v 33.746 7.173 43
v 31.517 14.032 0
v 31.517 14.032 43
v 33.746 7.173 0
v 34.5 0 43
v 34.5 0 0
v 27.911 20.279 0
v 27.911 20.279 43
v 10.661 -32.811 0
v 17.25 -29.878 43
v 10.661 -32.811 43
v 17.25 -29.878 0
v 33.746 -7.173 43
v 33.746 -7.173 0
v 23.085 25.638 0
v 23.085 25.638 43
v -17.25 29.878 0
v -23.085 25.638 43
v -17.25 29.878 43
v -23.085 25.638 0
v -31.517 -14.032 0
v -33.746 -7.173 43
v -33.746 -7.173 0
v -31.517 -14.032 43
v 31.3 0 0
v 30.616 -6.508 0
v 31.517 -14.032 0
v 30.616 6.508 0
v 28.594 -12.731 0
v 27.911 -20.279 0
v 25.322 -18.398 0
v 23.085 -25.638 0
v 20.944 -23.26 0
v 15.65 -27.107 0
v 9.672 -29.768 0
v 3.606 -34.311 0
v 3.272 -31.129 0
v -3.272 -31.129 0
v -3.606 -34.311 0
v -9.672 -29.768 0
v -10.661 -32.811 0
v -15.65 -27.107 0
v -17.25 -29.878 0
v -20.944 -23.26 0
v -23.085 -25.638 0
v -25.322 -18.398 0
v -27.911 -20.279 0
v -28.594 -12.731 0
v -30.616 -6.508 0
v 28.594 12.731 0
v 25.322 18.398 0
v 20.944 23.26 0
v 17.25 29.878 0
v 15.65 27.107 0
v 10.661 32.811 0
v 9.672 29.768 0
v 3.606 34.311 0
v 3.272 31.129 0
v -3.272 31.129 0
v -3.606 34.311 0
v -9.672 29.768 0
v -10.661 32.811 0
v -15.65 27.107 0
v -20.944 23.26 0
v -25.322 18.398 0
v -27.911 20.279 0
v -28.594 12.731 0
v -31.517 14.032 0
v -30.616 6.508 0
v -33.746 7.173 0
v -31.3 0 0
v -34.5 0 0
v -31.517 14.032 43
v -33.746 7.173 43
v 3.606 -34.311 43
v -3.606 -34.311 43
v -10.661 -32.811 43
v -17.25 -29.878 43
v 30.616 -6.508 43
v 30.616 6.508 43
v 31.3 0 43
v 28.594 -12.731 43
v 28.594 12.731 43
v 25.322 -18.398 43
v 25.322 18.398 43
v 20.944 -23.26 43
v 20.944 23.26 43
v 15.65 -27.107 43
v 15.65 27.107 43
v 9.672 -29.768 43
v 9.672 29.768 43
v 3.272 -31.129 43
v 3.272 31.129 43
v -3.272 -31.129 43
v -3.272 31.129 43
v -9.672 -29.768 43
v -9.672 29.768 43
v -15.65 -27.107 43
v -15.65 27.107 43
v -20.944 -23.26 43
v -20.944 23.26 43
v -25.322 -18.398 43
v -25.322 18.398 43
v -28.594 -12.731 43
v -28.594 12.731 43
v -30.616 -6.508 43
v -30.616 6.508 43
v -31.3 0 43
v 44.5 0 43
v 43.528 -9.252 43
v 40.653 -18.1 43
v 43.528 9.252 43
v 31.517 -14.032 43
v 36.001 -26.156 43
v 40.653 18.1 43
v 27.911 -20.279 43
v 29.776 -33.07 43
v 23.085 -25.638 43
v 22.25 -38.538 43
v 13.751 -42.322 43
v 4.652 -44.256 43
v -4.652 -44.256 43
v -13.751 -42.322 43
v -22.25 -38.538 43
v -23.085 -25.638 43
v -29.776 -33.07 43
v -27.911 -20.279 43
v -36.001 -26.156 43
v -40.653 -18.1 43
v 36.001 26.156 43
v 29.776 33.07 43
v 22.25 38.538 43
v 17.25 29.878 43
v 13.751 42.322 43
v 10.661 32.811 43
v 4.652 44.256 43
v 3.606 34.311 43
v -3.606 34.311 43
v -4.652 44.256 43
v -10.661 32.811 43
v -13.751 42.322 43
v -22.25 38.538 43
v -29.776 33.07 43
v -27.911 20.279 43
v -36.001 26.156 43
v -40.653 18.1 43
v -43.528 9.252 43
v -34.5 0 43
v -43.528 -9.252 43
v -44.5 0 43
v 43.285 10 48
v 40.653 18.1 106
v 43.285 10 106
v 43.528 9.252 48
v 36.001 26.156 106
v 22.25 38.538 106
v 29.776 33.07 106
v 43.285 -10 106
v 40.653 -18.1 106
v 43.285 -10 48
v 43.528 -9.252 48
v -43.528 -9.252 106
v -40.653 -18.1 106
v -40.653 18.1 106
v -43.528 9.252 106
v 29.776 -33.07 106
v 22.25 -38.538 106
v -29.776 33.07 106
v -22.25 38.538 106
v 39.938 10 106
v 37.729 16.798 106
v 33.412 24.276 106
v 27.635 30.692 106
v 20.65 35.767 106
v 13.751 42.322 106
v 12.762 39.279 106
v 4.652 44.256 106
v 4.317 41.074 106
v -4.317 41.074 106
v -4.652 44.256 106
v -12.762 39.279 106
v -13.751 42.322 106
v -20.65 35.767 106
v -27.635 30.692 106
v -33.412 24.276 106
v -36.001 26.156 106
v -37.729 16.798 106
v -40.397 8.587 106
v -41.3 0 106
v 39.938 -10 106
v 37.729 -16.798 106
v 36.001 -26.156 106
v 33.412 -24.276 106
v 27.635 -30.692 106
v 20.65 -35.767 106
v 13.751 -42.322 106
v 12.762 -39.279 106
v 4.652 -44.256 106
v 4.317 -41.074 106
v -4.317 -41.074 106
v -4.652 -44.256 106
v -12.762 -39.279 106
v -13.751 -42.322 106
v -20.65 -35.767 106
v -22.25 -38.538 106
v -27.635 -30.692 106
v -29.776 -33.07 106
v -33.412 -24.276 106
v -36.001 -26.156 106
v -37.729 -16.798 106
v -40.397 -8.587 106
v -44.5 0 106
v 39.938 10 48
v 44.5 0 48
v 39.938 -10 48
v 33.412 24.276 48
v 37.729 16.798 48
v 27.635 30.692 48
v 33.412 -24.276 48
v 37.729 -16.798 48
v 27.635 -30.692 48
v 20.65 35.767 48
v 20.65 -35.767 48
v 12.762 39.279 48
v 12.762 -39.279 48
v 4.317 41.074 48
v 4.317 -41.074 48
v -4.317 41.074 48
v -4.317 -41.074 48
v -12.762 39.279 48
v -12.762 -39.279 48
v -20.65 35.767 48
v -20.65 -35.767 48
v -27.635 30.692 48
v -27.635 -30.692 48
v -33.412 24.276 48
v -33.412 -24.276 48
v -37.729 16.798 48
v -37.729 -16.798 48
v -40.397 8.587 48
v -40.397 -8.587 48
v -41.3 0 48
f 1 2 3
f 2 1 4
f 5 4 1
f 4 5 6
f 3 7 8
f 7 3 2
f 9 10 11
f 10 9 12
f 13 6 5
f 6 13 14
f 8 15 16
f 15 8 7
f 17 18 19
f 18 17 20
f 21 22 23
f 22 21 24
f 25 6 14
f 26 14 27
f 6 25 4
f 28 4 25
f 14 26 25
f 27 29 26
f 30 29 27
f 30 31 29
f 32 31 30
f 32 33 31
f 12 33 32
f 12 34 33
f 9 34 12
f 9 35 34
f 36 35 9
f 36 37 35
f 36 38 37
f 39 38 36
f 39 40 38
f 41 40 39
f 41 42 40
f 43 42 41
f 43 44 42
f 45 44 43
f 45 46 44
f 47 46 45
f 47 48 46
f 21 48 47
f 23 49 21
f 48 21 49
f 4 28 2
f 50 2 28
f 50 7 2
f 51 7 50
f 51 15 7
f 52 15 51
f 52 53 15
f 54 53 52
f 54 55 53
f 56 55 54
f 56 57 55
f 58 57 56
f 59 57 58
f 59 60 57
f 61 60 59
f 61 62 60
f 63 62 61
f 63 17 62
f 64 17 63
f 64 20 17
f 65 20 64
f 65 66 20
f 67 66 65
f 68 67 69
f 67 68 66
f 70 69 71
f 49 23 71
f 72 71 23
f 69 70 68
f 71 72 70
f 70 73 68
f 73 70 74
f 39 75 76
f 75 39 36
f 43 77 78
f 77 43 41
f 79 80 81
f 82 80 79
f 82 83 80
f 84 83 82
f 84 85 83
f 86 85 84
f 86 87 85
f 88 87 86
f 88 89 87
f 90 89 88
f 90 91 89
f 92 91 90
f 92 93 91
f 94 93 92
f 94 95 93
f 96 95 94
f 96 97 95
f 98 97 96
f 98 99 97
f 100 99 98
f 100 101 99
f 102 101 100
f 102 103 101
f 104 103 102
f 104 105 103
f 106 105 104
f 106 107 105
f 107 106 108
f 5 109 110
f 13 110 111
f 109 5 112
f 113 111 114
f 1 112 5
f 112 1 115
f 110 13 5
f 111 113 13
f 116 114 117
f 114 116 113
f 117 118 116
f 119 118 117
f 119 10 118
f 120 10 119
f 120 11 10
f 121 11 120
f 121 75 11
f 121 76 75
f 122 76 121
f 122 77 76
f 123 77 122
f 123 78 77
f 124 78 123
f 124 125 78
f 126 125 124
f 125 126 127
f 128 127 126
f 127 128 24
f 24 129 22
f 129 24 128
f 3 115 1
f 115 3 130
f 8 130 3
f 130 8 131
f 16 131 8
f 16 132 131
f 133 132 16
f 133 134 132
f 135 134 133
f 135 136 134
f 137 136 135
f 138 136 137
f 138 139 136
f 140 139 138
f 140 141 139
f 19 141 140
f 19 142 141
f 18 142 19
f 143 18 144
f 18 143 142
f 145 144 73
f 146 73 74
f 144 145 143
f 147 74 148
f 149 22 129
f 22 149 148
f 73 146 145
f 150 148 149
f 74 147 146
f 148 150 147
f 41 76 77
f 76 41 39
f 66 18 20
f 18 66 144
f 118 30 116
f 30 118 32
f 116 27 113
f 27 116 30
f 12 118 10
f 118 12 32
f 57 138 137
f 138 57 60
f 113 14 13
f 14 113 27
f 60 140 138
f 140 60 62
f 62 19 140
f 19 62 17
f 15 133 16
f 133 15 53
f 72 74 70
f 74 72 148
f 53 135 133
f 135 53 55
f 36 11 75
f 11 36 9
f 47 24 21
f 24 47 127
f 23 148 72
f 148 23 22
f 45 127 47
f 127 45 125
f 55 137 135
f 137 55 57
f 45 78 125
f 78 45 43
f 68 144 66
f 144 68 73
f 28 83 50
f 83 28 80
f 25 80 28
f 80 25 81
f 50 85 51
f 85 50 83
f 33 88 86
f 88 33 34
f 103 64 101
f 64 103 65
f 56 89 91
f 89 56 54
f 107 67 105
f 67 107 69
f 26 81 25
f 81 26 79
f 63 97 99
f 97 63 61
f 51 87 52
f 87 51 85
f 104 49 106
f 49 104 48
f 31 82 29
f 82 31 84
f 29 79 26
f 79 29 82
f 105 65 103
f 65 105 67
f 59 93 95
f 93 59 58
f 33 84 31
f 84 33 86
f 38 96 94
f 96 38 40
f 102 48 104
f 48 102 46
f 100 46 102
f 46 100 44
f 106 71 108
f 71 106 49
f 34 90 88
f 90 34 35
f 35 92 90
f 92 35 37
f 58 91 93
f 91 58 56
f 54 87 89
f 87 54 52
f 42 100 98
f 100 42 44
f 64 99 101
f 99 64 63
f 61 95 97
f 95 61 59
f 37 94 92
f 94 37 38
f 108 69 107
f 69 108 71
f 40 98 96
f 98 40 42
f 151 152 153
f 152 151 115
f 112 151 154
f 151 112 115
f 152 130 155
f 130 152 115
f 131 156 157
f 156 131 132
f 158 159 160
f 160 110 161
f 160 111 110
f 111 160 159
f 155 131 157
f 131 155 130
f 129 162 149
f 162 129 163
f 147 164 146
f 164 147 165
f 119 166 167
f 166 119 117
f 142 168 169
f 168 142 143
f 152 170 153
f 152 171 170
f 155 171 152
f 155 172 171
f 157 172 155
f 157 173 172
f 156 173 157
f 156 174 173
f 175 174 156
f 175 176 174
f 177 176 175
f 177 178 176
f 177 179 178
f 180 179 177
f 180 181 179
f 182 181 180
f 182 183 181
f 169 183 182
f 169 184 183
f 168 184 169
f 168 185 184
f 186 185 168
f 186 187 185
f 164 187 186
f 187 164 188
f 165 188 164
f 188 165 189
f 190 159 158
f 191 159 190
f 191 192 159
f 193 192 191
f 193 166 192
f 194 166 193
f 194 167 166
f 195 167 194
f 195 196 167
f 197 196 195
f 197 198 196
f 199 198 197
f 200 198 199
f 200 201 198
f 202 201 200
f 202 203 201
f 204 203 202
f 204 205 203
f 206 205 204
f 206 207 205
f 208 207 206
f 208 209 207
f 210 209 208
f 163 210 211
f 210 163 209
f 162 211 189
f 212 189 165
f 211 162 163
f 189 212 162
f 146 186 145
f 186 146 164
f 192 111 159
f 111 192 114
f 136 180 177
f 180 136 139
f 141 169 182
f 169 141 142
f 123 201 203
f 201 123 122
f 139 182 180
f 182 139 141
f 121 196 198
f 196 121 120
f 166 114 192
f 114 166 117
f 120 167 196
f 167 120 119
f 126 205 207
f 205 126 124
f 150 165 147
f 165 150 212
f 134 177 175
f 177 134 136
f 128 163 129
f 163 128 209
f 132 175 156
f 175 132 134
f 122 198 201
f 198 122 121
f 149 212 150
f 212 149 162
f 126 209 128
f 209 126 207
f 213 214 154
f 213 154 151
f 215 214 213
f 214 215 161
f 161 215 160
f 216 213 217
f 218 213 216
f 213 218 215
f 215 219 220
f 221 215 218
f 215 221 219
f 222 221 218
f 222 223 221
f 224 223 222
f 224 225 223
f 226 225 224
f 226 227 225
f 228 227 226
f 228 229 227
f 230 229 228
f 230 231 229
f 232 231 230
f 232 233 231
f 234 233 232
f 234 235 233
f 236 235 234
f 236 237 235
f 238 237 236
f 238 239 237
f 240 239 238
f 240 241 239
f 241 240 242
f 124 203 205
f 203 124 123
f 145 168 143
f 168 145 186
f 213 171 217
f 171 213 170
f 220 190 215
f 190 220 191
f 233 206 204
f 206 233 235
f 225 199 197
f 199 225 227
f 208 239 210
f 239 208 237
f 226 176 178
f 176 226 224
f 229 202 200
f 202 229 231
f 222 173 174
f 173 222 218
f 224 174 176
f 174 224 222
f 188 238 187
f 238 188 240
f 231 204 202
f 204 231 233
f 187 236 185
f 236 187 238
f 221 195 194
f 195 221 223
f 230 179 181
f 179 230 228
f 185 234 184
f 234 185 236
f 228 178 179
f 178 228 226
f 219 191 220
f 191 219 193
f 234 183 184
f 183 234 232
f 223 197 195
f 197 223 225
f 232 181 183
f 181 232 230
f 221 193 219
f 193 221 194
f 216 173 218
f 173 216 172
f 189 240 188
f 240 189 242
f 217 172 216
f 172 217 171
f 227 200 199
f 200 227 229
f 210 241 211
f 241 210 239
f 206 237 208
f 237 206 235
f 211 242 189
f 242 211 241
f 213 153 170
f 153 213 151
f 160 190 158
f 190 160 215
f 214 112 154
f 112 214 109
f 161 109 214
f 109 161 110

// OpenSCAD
// Generated by SolidPython 1.1.3 on 2022-08-22 19:58:12


union() {
	difference() {
		cylinder(h = 43, r = 34.5000000000);
		cylinder(h = 43, r = 31.3000000000);
	}
	translate(v = [0, 0, 43]) {
		cylinder(h = 5, r = 44.5000000000);
	}
	difference() {
		translate(v = [0, 0, 48]) {
			difference() {
				cylinder(h = 58.0000000000, r = 44.5000000000);
				cylinder(h = 58.0000000000, r = 41.3000000000);
			}
		}
		translate(v = [39.5000000000, 0, 48]) {
			cube(center = true, size = [20, 20, 116]);
		}
	}
}
